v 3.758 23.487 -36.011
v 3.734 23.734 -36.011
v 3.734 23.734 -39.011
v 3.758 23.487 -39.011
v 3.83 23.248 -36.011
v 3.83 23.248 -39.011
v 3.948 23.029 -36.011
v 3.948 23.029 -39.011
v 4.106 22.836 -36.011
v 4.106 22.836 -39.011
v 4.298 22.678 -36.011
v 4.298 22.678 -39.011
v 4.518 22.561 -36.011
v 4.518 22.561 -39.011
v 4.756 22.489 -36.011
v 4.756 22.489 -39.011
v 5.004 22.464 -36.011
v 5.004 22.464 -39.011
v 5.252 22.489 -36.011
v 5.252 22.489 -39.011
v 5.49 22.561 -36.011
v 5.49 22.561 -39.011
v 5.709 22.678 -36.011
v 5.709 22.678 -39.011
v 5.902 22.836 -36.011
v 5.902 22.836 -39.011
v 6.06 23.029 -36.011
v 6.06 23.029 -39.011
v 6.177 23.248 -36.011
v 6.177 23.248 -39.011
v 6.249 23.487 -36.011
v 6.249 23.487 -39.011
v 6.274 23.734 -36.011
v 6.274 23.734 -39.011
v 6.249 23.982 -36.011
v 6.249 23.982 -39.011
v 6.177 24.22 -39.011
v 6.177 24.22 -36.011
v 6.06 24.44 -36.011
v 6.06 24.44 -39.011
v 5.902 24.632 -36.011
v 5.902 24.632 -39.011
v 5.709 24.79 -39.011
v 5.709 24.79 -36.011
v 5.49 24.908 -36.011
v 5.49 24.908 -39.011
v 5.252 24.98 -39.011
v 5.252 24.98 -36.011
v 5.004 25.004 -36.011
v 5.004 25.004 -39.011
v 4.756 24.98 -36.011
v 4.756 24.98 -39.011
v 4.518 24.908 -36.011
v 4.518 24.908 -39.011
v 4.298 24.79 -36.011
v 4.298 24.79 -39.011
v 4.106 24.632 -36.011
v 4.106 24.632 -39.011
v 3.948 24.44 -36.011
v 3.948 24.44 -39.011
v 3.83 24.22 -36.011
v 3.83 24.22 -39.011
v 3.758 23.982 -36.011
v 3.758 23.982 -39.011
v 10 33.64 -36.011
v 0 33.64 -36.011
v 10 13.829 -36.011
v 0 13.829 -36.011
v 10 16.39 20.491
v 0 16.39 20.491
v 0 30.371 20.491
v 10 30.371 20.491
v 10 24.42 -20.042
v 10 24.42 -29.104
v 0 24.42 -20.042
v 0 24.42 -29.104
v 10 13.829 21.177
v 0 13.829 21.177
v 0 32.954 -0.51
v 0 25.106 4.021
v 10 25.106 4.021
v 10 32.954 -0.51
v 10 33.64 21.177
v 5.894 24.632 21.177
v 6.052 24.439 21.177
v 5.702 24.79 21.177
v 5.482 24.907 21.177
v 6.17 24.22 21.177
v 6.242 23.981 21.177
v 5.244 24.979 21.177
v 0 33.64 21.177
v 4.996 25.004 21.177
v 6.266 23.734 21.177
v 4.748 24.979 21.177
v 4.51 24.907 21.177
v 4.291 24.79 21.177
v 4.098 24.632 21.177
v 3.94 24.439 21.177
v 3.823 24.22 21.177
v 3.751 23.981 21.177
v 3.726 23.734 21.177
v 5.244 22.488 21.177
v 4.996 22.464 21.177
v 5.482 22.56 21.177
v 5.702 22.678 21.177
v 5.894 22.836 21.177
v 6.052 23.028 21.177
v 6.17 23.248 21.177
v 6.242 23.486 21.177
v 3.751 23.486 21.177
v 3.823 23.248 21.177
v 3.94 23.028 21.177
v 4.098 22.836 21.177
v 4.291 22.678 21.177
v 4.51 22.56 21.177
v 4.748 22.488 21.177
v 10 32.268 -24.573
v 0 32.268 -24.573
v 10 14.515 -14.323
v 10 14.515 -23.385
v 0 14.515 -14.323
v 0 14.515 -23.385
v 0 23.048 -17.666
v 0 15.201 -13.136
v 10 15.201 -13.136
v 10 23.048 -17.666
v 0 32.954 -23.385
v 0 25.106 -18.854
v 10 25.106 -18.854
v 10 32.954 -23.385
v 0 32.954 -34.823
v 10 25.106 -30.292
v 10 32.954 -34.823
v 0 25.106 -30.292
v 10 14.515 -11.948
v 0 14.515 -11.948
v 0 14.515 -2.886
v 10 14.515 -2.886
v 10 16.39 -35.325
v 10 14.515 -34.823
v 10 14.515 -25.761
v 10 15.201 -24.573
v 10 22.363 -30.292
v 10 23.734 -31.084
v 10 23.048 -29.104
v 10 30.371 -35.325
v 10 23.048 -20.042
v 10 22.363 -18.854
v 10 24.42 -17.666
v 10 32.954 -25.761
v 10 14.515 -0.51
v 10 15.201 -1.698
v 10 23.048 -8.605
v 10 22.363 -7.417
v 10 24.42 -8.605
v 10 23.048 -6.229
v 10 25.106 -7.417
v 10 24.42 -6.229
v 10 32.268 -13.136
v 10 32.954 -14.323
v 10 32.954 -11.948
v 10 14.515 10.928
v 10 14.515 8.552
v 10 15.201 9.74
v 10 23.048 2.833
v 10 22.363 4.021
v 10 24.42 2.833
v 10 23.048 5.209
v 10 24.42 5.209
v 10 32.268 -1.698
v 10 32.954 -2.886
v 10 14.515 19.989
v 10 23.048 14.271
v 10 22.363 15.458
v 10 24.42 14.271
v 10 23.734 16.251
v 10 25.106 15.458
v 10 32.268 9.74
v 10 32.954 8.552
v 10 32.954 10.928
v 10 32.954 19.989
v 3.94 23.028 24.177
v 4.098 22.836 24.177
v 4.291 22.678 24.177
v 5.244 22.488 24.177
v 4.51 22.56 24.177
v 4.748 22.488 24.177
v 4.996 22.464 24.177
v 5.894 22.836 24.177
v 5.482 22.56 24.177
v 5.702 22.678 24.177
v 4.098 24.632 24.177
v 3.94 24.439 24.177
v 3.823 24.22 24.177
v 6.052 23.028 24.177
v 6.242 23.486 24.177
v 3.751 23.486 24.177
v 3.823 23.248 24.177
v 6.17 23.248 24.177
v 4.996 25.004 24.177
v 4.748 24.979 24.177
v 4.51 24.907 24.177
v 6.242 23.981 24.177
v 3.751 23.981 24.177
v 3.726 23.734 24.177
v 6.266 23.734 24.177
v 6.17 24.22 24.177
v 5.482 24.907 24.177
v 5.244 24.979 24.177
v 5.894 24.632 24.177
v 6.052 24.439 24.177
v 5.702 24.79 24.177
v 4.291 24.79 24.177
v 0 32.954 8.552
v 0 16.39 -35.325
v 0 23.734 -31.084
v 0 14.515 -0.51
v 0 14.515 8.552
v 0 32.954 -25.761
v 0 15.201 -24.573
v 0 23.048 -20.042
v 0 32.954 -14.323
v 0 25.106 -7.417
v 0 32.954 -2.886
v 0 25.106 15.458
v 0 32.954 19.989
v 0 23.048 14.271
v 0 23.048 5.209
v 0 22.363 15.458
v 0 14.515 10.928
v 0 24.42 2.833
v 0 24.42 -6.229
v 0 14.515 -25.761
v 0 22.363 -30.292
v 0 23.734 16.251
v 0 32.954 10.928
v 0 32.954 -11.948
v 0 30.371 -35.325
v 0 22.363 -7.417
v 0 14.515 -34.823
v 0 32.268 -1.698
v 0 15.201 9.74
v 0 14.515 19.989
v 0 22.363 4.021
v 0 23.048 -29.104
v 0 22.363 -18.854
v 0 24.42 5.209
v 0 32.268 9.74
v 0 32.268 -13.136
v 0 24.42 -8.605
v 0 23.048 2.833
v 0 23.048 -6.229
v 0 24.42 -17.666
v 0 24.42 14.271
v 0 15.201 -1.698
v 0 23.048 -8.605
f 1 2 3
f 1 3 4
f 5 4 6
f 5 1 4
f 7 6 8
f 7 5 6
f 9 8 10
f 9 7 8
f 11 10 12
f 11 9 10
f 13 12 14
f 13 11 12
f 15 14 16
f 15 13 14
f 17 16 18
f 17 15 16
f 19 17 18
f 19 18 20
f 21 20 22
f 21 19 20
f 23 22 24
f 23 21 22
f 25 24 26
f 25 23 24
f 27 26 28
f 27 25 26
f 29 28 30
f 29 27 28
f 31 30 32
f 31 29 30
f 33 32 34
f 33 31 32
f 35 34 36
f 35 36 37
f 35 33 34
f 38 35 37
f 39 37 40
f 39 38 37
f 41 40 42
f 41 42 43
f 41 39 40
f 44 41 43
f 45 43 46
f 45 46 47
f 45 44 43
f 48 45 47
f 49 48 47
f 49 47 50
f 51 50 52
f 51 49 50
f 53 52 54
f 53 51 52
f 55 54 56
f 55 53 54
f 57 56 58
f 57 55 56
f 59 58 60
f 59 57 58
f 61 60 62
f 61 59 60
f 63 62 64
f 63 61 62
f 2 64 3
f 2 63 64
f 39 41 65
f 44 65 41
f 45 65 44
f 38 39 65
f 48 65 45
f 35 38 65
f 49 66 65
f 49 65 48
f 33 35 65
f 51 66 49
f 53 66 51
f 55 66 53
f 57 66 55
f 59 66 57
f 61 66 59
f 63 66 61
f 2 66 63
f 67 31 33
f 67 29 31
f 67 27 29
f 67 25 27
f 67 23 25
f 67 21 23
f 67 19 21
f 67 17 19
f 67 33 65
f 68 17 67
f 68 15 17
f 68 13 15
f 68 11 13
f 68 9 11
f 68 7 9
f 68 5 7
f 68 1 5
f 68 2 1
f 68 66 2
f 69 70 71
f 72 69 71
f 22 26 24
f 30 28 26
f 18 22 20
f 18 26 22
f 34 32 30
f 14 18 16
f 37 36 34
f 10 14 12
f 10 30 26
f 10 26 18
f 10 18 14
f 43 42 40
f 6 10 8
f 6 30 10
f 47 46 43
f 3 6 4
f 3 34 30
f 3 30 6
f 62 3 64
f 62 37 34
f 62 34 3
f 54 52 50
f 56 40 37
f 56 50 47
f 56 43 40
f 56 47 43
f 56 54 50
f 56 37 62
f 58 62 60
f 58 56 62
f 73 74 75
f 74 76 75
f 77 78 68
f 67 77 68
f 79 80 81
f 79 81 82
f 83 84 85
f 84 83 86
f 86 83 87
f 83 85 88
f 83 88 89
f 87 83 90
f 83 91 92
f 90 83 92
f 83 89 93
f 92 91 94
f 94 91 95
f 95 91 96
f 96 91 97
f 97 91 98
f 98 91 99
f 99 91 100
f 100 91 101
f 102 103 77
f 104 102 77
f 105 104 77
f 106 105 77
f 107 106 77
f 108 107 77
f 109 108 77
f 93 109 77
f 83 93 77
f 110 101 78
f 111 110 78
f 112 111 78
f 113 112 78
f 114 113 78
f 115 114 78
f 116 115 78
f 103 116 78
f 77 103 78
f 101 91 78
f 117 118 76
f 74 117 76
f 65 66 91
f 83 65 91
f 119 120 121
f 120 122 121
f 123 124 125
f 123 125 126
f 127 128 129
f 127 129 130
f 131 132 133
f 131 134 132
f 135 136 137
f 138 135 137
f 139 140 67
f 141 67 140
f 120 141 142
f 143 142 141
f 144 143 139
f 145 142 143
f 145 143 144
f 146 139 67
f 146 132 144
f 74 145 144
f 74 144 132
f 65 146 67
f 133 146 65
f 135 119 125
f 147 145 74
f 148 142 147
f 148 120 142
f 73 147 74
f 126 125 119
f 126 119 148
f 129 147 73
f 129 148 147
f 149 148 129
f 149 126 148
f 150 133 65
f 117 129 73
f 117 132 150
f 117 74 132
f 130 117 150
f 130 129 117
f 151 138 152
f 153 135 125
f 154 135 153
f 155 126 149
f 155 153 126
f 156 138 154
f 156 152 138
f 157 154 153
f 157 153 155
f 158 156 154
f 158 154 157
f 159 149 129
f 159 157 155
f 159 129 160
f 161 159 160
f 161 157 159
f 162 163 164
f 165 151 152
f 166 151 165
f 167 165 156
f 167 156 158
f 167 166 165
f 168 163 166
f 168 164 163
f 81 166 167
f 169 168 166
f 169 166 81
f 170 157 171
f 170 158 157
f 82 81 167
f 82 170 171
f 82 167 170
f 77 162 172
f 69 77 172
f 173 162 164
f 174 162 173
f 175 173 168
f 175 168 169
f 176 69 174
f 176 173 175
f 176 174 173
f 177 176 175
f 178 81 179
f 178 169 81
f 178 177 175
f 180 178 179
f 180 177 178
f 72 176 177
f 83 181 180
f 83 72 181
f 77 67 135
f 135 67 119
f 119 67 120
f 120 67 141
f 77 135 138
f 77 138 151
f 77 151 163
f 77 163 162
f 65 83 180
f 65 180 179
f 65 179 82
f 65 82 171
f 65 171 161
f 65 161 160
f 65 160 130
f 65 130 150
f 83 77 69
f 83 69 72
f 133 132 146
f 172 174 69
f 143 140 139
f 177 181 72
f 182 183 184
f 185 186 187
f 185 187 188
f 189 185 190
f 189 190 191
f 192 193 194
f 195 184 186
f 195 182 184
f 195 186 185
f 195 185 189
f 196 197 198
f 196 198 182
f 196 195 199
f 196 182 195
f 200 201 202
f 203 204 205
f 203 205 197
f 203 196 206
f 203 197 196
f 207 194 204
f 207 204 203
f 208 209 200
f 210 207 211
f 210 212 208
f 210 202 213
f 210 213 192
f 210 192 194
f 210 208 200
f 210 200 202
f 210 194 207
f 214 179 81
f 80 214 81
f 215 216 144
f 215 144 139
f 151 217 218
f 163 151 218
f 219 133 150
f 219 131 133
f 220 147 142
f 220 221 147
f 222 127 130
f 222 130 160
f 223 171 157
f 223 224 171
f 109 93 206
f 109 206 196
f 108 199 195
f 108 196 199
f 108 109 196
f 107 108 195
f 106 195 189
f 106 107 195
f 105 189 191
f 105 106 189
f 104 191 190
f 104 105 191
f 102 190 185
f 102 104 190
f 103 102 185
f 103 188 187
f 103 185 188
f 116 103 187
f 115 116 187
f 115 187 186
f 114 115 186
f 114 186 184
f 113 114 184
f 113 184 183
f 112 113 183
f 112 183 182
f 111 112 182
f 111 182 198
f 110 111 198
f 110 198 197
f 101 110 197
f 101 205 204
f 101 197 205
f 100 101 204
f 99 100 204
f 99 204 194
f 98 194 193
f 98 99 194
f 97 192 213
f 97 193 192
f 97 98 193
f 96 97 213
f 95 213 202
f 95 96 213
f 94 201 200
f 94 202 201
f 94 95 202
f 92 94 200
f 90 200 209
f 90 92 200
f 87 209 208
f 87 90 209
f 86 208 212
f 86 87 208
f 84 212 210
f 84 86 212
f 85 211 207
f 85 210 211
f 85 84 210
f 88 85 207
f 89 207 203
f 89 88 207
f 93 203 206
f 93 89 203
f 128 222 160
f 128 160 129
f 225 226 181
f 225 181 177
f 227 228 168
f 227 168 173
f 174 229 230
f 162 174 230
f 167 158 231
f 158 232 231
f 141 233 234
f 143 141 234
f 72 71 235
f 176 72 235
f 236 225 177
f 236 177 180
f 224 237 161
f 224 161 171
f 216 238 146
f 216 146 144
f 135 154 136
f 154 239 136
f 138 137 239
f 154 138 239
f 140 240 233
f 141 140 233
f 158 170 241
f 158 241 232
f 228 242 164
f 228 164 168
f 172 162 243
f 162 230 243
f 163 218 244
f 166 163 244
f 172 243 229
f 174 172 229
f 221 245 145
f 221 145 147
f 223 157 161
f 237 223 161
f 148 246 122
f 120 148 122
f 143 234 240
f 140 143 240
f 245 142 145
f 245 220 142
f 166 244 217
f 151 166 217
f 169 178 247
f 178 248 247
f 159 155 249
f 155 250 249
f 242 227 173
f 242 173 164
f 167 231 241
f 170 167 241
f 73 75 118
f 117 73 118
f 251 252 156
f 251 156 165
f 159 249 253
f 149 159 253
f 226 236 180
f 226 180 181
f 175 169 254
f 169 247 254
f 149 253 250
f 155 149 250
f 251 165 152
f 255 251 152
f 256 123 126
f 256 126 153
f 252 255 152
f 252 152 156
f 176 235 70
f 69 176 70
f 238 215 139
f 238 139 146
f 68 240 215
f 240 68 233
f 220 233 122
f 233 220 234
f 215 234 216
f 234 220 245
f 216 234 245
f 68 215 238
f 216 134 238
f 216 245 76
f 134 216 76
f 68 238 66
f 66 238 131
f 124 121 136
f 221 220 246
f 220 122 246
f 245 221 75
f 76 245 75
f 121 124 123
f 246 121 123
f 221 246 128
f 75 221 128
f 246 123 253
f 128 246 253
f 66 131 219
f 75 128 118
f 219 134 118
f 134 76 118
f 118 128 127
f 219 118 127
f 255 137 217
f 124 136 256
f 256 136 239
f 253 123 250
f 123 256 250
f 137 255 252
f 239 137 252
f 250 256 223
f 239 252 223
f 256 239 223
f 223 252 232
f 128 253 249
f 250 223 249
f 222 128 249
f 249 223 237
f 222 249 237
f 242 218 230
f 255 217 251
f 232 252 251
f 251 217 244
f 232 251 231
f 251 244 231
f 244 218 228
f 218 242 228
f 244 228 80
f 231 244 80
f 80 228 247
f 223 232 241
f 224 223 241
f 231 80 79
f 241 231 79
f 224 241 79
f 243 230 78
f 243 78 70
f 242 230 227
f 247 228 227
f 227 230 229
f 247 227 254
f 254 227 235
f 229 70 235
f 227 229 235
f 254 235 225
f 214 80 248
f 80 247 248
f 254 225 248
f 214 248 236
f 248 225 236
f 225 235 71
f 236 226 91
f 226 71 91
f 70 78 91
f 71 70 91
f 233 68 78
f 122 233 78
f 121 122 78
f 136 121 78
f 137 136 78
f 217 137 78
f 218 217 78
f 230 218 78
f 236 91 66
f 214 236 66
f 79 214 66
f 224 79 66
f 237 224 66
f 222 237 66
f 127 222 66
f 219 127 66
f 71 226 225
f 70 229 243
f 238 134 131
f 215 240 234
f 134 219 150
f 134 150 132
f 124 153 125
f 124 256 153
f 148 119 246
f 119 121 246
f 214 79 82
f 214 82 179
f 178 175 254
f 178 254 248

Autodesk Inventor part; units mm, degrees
ref_plane "YZ Plane" through (0, 0, 0) normal (1, 0, 0) x (0, 1, 0)
ref_plane "XZ Plane" through (0, 0, 0) normal (0, 1, 0) x (-1, 0, 0)
ref_plane "XY Plane" through (0, 0, 0) normal (0, 0, 1) x (1, 0, 0)
sketch "Sketch1" plane through (0, 0, 0) normal (1, 0, 0) x (0, 1, 0)
  line L0 (23.7343, 15.4585) -> (23.7343, 4.0209)
  line L1 (23.7343, 4.0209) -> (33.6396, 9.7397)
  line L2 (33.6396, 9.7397) -> (23.7343, 15.4585)
  line L3 (32.268, 9.7397) -> (24.4201, 5.2087)
  line L4 (24.4201, 5.2087) -> (24.4201, 14.2706)
  line L5 (24.4201, 14.2706) -> (32.268, 9.7397)
  line L6 (33.6396, 9.7397) -> (23.7343, 4.0209)
  line L7 (33.6396, -1.698) -> (23.7343, 4.0209)
  line L8 (33.6396, 9.7397) -> (33.6396, -1.698)
  line L9 (32.9538, 8.5518) -> (25.1059, 4.0209)
  line L10 (25.1059, 4.0209) -> (32.9538, -0.5101)
  line L11 (32.9538, -0.5101) -> (32.9538, 8.5518)
  line L12 (23.7343, 4.0209) -> (23.7343, -7.4168)
  line L13 (23.7343, -7.4168) -> (33.6396, -1.698)
  line L14 (24.4201, -6.2289) -> (24.4201, 2.833)
  line L15 (24.4201, 2.833) -> (32.268, -1.698)
  line L16 (32.268, -1.698) -> (24.4201, -6.2289)
  line L17 (33.6396, -1.698) -> (33.6396, -13.1356)
  line L18 (33.6396, -13.1356) -> (23.7343, -7.4168)
  line L19 (32.9538, -11.9477) -> (32.9538, -2.8858)
  line L20 (25.1059, -7.4168) -> (32.9538, -11.9477)
  line L21 (32.9538, -2.8858) -> (25.1059, -7.4168)
  line L22 (23.7343, -7.4168) -> (23.7343, -18.8544)
  line L23 (24.4201, -17.6665) -> (24.4201, -8.6046)
  line L24 (23.7343, -18.8544) -> (33.6396, -13.1356)
  line L25 (32.268, -13.1356) -> (24.4201, -17.6665)
  line L26 (24.4201, -8.6046) -> (32.268, -13.1356)
  line L27 (33.6396, -13.1356) -> (33.6396, -24.5732)
  line L28 (32.9538, -14.3234) -> (25.1059, -18.8544)
  line L29 (25.1059, -18.8544) -> (32.9538, -23.3854)
  line L30 (33.6396, -24.5732) -> (23.7343, -18.8544)
  line L31 (32.9538, -23.3854) -> (32.9538, -14.3234)
  line L32 (23.7343, -18.8544) -> (23.7343, -30.292)
  line L33 (23.7343, -30.292) -> (33.6396, -24.5732)
  line L34 (32.268, -24.5732) -> (24.4201, -29.1042)
  line L35 (24.4201, -29.1042) -> (24.4201, -20.0422)
  line L36 (24.4201, -20.0422) -> (32.268, -24.5732)
  line L37 (23.7343, 4.0209) -> (13.8291, 9.7397)
  line L38 (13.8291, 9.7397) -> (23.7343, 15.4585)
  line L39 (15.2007, 9.7397) -> (23.0485, 5.2087)
  line L40 (23.0485, 5.2087) -> (23.0485, 14.2706)
  line L41 (23.0485, 14.2706) -> (15.2007, 9.7397)
  line L42 (23.7343, 4.0209) -> (13.8291, 9.7397)
  line L43 (13.8291, -1.698) -> (23.7343, 4.0209)
  line L44 (13.8291, 9.7397) -> (13.8291, -1.698)
  line L45 (14.5149, 8.5518) -> (22.3627, 4.0209)
  line L46 (22.3627, 4.0209) -> (14.5149, -0.5101)
  line L47 (14.5149, -0.5101) -> (14.5149, 8.5518)
  line L48 (13.8291, -1.698) -> (23.7343, 4.0209)
  line L49 (23.7343, -7.4168) -> (13.8291, -1.698)
  line L50 (23.0485, 2.833) -> (15.2007, -1.698)
  line L51 (23.0485, -6.2289) -> (23.0485, 2.833)
  line L52 (15.2007, -1.698) -> (23.0485, -6.2289)
  line L53 (13.8291, -13.1356) -> (23.7343, -7.4168)
  line L54 (15.2007, -13.1356) -> (23.0485, -17.6665)
  line L55 (23.0485, -17.6665) -> (23.0485, -8.6046)
  line L56 (23.7343, -18.8544) -> (13.8291, -13.1356)
  line L57 (23.0485, -8.6046) -> (15.2007, -13.1356)
  line L58 (23.7343, -7.4168) -> (13.8291, -1.698)
  line L59 (14.5149, -2.8858) -> (22.3627, -7.4168)
  line L60 (13.8291, -1.698) -> (13.8291, -13.1356)
  line L61 (14.5149, -11.9477) -> (14.5149, -2.8858)
  line L62 (13.8291, -13.1356) -> (23.7343, -7.4168)
  line L63 (22.3627, -7.4168) -> (14.5149, -11.9477)
  line L64 (13.8291, -24.5732) -> (23.7343, -18.8544)
  line L65 (23.0485, -29.1042) -> (23.0485, -20.0422)
  line L66 (23.7343, -30.292) -> (13.8291, -24.5732)
  line L67 (23.0485, -20.0422) -> (15.2007, -24.5732)
  line L68 (15.2007, -24.5732) -> (23.0485, -29.1042)
  line L69 (23.7343, -18.8544) -> (13.8291, -13.1356)
  line L70 (13.8291, -13.1356) -> (13.8291, -24.5732)
  line L71 (14.5149, -23.3854) -> (14.5149, -14.3234)
  line L72 (14.5149, -14.3234) -> (22.3627, -18.8544)
  line L73 (13.8291, -24.5732) -> (23.7343, -18.8544)
  line L74 (22.3627, -18.8544) -> (14.5149, -23.3854)
  line L75 (13.8291, 9.7397) -> (13.8291, 21.1773)
  line L76 (13.8291, 21.1773) -> (23.7343, 15.4585)
  line L77 (33.6396, 9.7397) -> (33.6396, 21.1773)
  line L78 (33.6396, 21.1773) -> (23.7343, 15.4585)
  line L79 (33.6396, 21.1773) -> (13.8291, 21.1773)
  line L80 (33.6396, -24.5732) -> (33.6396, -36.0108)
  line L81 (33.6396, -36.0108) -> (23.7343, -30.292)
  line L82 (13.8291, -24.5732) -> (13.8291, -36.0108)
  line L83 (13.8291, -36.0108) -> (23.7343, -30.292)
  line L84 (33.6396, -36.0108) -> (13.8291, -36.0108)
  line L85 (14.5149, 10.9275) -> (14.5149, 19.9894)
  line L86 (22.3627, 15.4585) -> (14.5149, 10.9275)
  line L87 (14.5149, 19.9894) -> (22.3627, 15.4585)
  line L88 (32.9538, 10.9275) -> (32.9538, 19.9894)
  line L89 (32.9538, 19.9894) -> (25.1059, 15.4585)
  line L90 (25.1059, 15.4585) -> (32.9538, 10.9275)
  line L91 (25.1059, -30.292) -> (32.9538, -34.823)
  line L92 (32.9538, -34.823) -> (32.9538, -25.761)
  line L93 (32.9538, -25.761) -> (25.1059, -30.292)
  line L94 (22.3627, -30.292) -> (14.5149, -34.823)
  line L95 (14.5149, -34.823) -> (14.5149, -25.761)
  line L96 (14.5149, -25.761) -> (22.3627, -30.292)
  line L97 (24.8388, 20.491) -> (30.3708, 20.491)
  line L98 (30.3708, 20.491) -> (23.7343, 16.2509)
  line L99 (23.7343, 16.2509) -> (16.3902, 20.491)
  line L100 (16.3902, 20.491) -> (24.8388, 20.491)
  line L101 (24.8388, -35.3246) -> (30.3708, -35.3246)
  line L102 (30.3708, -35.3246) -> (23.7343, -31.0844)
  line L103 (23.7343, -31.0844) -> (16.3902, -35.3246)
  line L104 (16.3902, -35.3246) -> (24.8388, -35.3246)
  dimension "d13" = 0.6858
extrude "Extrusion1" add sketch "Sketch1" along normal blind 10
sketch "Sketch2" plane through (0, 13.8291, 21.1773) normal (0, 0, 1) x (1, 0, 0)
  line L0 (0, 19.8105) -> (10, 19.8105) projected
  line L1 (10, 19.8105) -> (10, 9.9045)
  line L2 (10, 19.8105) -> (10, 0) projected
  line L3 (10, 9.9045) -> (4.9962, 9.9045)
  circle A0 centre (4.9962, 9.9045) radius 1.27
  point P0 (0, -13.8291)
  point P1 (0, 9.9053)
  dimension "d39" = 9.906
  dimension "d40" = 5.0038
  dimension "d41" = 2.54
sketch "Sketch3" plane through (0, 13.8291, -36.0108) normal (0, 0, -1) x (-1, 0, 0)
  line L0 (0, 19.8105) -> (-10, 19.8105) projected
  line L1 (0, 10.5911) -> (-10, 10.5911) projected
  line L2 (0, 19.8105) -> (-10, 19.8105) projected
  line L3 (0, 19.8105) -> (0, 9.9045)
  line L4 (0, 0) -> (0, 19.8105) projected
  circle A0 centre (-5.0038, 9.9053) radius 1.27
  point P0 (0, -13.8291)
  dimension "d44" = 9.906
  dimension "d46" = 2.54
extrude "Extrusion4" add sketch "Sketch2" along normal blind 3
extrude "Extrusion5" add sketch "Sketch3" along normal blind 3
properties part number "Arm support half scale"
